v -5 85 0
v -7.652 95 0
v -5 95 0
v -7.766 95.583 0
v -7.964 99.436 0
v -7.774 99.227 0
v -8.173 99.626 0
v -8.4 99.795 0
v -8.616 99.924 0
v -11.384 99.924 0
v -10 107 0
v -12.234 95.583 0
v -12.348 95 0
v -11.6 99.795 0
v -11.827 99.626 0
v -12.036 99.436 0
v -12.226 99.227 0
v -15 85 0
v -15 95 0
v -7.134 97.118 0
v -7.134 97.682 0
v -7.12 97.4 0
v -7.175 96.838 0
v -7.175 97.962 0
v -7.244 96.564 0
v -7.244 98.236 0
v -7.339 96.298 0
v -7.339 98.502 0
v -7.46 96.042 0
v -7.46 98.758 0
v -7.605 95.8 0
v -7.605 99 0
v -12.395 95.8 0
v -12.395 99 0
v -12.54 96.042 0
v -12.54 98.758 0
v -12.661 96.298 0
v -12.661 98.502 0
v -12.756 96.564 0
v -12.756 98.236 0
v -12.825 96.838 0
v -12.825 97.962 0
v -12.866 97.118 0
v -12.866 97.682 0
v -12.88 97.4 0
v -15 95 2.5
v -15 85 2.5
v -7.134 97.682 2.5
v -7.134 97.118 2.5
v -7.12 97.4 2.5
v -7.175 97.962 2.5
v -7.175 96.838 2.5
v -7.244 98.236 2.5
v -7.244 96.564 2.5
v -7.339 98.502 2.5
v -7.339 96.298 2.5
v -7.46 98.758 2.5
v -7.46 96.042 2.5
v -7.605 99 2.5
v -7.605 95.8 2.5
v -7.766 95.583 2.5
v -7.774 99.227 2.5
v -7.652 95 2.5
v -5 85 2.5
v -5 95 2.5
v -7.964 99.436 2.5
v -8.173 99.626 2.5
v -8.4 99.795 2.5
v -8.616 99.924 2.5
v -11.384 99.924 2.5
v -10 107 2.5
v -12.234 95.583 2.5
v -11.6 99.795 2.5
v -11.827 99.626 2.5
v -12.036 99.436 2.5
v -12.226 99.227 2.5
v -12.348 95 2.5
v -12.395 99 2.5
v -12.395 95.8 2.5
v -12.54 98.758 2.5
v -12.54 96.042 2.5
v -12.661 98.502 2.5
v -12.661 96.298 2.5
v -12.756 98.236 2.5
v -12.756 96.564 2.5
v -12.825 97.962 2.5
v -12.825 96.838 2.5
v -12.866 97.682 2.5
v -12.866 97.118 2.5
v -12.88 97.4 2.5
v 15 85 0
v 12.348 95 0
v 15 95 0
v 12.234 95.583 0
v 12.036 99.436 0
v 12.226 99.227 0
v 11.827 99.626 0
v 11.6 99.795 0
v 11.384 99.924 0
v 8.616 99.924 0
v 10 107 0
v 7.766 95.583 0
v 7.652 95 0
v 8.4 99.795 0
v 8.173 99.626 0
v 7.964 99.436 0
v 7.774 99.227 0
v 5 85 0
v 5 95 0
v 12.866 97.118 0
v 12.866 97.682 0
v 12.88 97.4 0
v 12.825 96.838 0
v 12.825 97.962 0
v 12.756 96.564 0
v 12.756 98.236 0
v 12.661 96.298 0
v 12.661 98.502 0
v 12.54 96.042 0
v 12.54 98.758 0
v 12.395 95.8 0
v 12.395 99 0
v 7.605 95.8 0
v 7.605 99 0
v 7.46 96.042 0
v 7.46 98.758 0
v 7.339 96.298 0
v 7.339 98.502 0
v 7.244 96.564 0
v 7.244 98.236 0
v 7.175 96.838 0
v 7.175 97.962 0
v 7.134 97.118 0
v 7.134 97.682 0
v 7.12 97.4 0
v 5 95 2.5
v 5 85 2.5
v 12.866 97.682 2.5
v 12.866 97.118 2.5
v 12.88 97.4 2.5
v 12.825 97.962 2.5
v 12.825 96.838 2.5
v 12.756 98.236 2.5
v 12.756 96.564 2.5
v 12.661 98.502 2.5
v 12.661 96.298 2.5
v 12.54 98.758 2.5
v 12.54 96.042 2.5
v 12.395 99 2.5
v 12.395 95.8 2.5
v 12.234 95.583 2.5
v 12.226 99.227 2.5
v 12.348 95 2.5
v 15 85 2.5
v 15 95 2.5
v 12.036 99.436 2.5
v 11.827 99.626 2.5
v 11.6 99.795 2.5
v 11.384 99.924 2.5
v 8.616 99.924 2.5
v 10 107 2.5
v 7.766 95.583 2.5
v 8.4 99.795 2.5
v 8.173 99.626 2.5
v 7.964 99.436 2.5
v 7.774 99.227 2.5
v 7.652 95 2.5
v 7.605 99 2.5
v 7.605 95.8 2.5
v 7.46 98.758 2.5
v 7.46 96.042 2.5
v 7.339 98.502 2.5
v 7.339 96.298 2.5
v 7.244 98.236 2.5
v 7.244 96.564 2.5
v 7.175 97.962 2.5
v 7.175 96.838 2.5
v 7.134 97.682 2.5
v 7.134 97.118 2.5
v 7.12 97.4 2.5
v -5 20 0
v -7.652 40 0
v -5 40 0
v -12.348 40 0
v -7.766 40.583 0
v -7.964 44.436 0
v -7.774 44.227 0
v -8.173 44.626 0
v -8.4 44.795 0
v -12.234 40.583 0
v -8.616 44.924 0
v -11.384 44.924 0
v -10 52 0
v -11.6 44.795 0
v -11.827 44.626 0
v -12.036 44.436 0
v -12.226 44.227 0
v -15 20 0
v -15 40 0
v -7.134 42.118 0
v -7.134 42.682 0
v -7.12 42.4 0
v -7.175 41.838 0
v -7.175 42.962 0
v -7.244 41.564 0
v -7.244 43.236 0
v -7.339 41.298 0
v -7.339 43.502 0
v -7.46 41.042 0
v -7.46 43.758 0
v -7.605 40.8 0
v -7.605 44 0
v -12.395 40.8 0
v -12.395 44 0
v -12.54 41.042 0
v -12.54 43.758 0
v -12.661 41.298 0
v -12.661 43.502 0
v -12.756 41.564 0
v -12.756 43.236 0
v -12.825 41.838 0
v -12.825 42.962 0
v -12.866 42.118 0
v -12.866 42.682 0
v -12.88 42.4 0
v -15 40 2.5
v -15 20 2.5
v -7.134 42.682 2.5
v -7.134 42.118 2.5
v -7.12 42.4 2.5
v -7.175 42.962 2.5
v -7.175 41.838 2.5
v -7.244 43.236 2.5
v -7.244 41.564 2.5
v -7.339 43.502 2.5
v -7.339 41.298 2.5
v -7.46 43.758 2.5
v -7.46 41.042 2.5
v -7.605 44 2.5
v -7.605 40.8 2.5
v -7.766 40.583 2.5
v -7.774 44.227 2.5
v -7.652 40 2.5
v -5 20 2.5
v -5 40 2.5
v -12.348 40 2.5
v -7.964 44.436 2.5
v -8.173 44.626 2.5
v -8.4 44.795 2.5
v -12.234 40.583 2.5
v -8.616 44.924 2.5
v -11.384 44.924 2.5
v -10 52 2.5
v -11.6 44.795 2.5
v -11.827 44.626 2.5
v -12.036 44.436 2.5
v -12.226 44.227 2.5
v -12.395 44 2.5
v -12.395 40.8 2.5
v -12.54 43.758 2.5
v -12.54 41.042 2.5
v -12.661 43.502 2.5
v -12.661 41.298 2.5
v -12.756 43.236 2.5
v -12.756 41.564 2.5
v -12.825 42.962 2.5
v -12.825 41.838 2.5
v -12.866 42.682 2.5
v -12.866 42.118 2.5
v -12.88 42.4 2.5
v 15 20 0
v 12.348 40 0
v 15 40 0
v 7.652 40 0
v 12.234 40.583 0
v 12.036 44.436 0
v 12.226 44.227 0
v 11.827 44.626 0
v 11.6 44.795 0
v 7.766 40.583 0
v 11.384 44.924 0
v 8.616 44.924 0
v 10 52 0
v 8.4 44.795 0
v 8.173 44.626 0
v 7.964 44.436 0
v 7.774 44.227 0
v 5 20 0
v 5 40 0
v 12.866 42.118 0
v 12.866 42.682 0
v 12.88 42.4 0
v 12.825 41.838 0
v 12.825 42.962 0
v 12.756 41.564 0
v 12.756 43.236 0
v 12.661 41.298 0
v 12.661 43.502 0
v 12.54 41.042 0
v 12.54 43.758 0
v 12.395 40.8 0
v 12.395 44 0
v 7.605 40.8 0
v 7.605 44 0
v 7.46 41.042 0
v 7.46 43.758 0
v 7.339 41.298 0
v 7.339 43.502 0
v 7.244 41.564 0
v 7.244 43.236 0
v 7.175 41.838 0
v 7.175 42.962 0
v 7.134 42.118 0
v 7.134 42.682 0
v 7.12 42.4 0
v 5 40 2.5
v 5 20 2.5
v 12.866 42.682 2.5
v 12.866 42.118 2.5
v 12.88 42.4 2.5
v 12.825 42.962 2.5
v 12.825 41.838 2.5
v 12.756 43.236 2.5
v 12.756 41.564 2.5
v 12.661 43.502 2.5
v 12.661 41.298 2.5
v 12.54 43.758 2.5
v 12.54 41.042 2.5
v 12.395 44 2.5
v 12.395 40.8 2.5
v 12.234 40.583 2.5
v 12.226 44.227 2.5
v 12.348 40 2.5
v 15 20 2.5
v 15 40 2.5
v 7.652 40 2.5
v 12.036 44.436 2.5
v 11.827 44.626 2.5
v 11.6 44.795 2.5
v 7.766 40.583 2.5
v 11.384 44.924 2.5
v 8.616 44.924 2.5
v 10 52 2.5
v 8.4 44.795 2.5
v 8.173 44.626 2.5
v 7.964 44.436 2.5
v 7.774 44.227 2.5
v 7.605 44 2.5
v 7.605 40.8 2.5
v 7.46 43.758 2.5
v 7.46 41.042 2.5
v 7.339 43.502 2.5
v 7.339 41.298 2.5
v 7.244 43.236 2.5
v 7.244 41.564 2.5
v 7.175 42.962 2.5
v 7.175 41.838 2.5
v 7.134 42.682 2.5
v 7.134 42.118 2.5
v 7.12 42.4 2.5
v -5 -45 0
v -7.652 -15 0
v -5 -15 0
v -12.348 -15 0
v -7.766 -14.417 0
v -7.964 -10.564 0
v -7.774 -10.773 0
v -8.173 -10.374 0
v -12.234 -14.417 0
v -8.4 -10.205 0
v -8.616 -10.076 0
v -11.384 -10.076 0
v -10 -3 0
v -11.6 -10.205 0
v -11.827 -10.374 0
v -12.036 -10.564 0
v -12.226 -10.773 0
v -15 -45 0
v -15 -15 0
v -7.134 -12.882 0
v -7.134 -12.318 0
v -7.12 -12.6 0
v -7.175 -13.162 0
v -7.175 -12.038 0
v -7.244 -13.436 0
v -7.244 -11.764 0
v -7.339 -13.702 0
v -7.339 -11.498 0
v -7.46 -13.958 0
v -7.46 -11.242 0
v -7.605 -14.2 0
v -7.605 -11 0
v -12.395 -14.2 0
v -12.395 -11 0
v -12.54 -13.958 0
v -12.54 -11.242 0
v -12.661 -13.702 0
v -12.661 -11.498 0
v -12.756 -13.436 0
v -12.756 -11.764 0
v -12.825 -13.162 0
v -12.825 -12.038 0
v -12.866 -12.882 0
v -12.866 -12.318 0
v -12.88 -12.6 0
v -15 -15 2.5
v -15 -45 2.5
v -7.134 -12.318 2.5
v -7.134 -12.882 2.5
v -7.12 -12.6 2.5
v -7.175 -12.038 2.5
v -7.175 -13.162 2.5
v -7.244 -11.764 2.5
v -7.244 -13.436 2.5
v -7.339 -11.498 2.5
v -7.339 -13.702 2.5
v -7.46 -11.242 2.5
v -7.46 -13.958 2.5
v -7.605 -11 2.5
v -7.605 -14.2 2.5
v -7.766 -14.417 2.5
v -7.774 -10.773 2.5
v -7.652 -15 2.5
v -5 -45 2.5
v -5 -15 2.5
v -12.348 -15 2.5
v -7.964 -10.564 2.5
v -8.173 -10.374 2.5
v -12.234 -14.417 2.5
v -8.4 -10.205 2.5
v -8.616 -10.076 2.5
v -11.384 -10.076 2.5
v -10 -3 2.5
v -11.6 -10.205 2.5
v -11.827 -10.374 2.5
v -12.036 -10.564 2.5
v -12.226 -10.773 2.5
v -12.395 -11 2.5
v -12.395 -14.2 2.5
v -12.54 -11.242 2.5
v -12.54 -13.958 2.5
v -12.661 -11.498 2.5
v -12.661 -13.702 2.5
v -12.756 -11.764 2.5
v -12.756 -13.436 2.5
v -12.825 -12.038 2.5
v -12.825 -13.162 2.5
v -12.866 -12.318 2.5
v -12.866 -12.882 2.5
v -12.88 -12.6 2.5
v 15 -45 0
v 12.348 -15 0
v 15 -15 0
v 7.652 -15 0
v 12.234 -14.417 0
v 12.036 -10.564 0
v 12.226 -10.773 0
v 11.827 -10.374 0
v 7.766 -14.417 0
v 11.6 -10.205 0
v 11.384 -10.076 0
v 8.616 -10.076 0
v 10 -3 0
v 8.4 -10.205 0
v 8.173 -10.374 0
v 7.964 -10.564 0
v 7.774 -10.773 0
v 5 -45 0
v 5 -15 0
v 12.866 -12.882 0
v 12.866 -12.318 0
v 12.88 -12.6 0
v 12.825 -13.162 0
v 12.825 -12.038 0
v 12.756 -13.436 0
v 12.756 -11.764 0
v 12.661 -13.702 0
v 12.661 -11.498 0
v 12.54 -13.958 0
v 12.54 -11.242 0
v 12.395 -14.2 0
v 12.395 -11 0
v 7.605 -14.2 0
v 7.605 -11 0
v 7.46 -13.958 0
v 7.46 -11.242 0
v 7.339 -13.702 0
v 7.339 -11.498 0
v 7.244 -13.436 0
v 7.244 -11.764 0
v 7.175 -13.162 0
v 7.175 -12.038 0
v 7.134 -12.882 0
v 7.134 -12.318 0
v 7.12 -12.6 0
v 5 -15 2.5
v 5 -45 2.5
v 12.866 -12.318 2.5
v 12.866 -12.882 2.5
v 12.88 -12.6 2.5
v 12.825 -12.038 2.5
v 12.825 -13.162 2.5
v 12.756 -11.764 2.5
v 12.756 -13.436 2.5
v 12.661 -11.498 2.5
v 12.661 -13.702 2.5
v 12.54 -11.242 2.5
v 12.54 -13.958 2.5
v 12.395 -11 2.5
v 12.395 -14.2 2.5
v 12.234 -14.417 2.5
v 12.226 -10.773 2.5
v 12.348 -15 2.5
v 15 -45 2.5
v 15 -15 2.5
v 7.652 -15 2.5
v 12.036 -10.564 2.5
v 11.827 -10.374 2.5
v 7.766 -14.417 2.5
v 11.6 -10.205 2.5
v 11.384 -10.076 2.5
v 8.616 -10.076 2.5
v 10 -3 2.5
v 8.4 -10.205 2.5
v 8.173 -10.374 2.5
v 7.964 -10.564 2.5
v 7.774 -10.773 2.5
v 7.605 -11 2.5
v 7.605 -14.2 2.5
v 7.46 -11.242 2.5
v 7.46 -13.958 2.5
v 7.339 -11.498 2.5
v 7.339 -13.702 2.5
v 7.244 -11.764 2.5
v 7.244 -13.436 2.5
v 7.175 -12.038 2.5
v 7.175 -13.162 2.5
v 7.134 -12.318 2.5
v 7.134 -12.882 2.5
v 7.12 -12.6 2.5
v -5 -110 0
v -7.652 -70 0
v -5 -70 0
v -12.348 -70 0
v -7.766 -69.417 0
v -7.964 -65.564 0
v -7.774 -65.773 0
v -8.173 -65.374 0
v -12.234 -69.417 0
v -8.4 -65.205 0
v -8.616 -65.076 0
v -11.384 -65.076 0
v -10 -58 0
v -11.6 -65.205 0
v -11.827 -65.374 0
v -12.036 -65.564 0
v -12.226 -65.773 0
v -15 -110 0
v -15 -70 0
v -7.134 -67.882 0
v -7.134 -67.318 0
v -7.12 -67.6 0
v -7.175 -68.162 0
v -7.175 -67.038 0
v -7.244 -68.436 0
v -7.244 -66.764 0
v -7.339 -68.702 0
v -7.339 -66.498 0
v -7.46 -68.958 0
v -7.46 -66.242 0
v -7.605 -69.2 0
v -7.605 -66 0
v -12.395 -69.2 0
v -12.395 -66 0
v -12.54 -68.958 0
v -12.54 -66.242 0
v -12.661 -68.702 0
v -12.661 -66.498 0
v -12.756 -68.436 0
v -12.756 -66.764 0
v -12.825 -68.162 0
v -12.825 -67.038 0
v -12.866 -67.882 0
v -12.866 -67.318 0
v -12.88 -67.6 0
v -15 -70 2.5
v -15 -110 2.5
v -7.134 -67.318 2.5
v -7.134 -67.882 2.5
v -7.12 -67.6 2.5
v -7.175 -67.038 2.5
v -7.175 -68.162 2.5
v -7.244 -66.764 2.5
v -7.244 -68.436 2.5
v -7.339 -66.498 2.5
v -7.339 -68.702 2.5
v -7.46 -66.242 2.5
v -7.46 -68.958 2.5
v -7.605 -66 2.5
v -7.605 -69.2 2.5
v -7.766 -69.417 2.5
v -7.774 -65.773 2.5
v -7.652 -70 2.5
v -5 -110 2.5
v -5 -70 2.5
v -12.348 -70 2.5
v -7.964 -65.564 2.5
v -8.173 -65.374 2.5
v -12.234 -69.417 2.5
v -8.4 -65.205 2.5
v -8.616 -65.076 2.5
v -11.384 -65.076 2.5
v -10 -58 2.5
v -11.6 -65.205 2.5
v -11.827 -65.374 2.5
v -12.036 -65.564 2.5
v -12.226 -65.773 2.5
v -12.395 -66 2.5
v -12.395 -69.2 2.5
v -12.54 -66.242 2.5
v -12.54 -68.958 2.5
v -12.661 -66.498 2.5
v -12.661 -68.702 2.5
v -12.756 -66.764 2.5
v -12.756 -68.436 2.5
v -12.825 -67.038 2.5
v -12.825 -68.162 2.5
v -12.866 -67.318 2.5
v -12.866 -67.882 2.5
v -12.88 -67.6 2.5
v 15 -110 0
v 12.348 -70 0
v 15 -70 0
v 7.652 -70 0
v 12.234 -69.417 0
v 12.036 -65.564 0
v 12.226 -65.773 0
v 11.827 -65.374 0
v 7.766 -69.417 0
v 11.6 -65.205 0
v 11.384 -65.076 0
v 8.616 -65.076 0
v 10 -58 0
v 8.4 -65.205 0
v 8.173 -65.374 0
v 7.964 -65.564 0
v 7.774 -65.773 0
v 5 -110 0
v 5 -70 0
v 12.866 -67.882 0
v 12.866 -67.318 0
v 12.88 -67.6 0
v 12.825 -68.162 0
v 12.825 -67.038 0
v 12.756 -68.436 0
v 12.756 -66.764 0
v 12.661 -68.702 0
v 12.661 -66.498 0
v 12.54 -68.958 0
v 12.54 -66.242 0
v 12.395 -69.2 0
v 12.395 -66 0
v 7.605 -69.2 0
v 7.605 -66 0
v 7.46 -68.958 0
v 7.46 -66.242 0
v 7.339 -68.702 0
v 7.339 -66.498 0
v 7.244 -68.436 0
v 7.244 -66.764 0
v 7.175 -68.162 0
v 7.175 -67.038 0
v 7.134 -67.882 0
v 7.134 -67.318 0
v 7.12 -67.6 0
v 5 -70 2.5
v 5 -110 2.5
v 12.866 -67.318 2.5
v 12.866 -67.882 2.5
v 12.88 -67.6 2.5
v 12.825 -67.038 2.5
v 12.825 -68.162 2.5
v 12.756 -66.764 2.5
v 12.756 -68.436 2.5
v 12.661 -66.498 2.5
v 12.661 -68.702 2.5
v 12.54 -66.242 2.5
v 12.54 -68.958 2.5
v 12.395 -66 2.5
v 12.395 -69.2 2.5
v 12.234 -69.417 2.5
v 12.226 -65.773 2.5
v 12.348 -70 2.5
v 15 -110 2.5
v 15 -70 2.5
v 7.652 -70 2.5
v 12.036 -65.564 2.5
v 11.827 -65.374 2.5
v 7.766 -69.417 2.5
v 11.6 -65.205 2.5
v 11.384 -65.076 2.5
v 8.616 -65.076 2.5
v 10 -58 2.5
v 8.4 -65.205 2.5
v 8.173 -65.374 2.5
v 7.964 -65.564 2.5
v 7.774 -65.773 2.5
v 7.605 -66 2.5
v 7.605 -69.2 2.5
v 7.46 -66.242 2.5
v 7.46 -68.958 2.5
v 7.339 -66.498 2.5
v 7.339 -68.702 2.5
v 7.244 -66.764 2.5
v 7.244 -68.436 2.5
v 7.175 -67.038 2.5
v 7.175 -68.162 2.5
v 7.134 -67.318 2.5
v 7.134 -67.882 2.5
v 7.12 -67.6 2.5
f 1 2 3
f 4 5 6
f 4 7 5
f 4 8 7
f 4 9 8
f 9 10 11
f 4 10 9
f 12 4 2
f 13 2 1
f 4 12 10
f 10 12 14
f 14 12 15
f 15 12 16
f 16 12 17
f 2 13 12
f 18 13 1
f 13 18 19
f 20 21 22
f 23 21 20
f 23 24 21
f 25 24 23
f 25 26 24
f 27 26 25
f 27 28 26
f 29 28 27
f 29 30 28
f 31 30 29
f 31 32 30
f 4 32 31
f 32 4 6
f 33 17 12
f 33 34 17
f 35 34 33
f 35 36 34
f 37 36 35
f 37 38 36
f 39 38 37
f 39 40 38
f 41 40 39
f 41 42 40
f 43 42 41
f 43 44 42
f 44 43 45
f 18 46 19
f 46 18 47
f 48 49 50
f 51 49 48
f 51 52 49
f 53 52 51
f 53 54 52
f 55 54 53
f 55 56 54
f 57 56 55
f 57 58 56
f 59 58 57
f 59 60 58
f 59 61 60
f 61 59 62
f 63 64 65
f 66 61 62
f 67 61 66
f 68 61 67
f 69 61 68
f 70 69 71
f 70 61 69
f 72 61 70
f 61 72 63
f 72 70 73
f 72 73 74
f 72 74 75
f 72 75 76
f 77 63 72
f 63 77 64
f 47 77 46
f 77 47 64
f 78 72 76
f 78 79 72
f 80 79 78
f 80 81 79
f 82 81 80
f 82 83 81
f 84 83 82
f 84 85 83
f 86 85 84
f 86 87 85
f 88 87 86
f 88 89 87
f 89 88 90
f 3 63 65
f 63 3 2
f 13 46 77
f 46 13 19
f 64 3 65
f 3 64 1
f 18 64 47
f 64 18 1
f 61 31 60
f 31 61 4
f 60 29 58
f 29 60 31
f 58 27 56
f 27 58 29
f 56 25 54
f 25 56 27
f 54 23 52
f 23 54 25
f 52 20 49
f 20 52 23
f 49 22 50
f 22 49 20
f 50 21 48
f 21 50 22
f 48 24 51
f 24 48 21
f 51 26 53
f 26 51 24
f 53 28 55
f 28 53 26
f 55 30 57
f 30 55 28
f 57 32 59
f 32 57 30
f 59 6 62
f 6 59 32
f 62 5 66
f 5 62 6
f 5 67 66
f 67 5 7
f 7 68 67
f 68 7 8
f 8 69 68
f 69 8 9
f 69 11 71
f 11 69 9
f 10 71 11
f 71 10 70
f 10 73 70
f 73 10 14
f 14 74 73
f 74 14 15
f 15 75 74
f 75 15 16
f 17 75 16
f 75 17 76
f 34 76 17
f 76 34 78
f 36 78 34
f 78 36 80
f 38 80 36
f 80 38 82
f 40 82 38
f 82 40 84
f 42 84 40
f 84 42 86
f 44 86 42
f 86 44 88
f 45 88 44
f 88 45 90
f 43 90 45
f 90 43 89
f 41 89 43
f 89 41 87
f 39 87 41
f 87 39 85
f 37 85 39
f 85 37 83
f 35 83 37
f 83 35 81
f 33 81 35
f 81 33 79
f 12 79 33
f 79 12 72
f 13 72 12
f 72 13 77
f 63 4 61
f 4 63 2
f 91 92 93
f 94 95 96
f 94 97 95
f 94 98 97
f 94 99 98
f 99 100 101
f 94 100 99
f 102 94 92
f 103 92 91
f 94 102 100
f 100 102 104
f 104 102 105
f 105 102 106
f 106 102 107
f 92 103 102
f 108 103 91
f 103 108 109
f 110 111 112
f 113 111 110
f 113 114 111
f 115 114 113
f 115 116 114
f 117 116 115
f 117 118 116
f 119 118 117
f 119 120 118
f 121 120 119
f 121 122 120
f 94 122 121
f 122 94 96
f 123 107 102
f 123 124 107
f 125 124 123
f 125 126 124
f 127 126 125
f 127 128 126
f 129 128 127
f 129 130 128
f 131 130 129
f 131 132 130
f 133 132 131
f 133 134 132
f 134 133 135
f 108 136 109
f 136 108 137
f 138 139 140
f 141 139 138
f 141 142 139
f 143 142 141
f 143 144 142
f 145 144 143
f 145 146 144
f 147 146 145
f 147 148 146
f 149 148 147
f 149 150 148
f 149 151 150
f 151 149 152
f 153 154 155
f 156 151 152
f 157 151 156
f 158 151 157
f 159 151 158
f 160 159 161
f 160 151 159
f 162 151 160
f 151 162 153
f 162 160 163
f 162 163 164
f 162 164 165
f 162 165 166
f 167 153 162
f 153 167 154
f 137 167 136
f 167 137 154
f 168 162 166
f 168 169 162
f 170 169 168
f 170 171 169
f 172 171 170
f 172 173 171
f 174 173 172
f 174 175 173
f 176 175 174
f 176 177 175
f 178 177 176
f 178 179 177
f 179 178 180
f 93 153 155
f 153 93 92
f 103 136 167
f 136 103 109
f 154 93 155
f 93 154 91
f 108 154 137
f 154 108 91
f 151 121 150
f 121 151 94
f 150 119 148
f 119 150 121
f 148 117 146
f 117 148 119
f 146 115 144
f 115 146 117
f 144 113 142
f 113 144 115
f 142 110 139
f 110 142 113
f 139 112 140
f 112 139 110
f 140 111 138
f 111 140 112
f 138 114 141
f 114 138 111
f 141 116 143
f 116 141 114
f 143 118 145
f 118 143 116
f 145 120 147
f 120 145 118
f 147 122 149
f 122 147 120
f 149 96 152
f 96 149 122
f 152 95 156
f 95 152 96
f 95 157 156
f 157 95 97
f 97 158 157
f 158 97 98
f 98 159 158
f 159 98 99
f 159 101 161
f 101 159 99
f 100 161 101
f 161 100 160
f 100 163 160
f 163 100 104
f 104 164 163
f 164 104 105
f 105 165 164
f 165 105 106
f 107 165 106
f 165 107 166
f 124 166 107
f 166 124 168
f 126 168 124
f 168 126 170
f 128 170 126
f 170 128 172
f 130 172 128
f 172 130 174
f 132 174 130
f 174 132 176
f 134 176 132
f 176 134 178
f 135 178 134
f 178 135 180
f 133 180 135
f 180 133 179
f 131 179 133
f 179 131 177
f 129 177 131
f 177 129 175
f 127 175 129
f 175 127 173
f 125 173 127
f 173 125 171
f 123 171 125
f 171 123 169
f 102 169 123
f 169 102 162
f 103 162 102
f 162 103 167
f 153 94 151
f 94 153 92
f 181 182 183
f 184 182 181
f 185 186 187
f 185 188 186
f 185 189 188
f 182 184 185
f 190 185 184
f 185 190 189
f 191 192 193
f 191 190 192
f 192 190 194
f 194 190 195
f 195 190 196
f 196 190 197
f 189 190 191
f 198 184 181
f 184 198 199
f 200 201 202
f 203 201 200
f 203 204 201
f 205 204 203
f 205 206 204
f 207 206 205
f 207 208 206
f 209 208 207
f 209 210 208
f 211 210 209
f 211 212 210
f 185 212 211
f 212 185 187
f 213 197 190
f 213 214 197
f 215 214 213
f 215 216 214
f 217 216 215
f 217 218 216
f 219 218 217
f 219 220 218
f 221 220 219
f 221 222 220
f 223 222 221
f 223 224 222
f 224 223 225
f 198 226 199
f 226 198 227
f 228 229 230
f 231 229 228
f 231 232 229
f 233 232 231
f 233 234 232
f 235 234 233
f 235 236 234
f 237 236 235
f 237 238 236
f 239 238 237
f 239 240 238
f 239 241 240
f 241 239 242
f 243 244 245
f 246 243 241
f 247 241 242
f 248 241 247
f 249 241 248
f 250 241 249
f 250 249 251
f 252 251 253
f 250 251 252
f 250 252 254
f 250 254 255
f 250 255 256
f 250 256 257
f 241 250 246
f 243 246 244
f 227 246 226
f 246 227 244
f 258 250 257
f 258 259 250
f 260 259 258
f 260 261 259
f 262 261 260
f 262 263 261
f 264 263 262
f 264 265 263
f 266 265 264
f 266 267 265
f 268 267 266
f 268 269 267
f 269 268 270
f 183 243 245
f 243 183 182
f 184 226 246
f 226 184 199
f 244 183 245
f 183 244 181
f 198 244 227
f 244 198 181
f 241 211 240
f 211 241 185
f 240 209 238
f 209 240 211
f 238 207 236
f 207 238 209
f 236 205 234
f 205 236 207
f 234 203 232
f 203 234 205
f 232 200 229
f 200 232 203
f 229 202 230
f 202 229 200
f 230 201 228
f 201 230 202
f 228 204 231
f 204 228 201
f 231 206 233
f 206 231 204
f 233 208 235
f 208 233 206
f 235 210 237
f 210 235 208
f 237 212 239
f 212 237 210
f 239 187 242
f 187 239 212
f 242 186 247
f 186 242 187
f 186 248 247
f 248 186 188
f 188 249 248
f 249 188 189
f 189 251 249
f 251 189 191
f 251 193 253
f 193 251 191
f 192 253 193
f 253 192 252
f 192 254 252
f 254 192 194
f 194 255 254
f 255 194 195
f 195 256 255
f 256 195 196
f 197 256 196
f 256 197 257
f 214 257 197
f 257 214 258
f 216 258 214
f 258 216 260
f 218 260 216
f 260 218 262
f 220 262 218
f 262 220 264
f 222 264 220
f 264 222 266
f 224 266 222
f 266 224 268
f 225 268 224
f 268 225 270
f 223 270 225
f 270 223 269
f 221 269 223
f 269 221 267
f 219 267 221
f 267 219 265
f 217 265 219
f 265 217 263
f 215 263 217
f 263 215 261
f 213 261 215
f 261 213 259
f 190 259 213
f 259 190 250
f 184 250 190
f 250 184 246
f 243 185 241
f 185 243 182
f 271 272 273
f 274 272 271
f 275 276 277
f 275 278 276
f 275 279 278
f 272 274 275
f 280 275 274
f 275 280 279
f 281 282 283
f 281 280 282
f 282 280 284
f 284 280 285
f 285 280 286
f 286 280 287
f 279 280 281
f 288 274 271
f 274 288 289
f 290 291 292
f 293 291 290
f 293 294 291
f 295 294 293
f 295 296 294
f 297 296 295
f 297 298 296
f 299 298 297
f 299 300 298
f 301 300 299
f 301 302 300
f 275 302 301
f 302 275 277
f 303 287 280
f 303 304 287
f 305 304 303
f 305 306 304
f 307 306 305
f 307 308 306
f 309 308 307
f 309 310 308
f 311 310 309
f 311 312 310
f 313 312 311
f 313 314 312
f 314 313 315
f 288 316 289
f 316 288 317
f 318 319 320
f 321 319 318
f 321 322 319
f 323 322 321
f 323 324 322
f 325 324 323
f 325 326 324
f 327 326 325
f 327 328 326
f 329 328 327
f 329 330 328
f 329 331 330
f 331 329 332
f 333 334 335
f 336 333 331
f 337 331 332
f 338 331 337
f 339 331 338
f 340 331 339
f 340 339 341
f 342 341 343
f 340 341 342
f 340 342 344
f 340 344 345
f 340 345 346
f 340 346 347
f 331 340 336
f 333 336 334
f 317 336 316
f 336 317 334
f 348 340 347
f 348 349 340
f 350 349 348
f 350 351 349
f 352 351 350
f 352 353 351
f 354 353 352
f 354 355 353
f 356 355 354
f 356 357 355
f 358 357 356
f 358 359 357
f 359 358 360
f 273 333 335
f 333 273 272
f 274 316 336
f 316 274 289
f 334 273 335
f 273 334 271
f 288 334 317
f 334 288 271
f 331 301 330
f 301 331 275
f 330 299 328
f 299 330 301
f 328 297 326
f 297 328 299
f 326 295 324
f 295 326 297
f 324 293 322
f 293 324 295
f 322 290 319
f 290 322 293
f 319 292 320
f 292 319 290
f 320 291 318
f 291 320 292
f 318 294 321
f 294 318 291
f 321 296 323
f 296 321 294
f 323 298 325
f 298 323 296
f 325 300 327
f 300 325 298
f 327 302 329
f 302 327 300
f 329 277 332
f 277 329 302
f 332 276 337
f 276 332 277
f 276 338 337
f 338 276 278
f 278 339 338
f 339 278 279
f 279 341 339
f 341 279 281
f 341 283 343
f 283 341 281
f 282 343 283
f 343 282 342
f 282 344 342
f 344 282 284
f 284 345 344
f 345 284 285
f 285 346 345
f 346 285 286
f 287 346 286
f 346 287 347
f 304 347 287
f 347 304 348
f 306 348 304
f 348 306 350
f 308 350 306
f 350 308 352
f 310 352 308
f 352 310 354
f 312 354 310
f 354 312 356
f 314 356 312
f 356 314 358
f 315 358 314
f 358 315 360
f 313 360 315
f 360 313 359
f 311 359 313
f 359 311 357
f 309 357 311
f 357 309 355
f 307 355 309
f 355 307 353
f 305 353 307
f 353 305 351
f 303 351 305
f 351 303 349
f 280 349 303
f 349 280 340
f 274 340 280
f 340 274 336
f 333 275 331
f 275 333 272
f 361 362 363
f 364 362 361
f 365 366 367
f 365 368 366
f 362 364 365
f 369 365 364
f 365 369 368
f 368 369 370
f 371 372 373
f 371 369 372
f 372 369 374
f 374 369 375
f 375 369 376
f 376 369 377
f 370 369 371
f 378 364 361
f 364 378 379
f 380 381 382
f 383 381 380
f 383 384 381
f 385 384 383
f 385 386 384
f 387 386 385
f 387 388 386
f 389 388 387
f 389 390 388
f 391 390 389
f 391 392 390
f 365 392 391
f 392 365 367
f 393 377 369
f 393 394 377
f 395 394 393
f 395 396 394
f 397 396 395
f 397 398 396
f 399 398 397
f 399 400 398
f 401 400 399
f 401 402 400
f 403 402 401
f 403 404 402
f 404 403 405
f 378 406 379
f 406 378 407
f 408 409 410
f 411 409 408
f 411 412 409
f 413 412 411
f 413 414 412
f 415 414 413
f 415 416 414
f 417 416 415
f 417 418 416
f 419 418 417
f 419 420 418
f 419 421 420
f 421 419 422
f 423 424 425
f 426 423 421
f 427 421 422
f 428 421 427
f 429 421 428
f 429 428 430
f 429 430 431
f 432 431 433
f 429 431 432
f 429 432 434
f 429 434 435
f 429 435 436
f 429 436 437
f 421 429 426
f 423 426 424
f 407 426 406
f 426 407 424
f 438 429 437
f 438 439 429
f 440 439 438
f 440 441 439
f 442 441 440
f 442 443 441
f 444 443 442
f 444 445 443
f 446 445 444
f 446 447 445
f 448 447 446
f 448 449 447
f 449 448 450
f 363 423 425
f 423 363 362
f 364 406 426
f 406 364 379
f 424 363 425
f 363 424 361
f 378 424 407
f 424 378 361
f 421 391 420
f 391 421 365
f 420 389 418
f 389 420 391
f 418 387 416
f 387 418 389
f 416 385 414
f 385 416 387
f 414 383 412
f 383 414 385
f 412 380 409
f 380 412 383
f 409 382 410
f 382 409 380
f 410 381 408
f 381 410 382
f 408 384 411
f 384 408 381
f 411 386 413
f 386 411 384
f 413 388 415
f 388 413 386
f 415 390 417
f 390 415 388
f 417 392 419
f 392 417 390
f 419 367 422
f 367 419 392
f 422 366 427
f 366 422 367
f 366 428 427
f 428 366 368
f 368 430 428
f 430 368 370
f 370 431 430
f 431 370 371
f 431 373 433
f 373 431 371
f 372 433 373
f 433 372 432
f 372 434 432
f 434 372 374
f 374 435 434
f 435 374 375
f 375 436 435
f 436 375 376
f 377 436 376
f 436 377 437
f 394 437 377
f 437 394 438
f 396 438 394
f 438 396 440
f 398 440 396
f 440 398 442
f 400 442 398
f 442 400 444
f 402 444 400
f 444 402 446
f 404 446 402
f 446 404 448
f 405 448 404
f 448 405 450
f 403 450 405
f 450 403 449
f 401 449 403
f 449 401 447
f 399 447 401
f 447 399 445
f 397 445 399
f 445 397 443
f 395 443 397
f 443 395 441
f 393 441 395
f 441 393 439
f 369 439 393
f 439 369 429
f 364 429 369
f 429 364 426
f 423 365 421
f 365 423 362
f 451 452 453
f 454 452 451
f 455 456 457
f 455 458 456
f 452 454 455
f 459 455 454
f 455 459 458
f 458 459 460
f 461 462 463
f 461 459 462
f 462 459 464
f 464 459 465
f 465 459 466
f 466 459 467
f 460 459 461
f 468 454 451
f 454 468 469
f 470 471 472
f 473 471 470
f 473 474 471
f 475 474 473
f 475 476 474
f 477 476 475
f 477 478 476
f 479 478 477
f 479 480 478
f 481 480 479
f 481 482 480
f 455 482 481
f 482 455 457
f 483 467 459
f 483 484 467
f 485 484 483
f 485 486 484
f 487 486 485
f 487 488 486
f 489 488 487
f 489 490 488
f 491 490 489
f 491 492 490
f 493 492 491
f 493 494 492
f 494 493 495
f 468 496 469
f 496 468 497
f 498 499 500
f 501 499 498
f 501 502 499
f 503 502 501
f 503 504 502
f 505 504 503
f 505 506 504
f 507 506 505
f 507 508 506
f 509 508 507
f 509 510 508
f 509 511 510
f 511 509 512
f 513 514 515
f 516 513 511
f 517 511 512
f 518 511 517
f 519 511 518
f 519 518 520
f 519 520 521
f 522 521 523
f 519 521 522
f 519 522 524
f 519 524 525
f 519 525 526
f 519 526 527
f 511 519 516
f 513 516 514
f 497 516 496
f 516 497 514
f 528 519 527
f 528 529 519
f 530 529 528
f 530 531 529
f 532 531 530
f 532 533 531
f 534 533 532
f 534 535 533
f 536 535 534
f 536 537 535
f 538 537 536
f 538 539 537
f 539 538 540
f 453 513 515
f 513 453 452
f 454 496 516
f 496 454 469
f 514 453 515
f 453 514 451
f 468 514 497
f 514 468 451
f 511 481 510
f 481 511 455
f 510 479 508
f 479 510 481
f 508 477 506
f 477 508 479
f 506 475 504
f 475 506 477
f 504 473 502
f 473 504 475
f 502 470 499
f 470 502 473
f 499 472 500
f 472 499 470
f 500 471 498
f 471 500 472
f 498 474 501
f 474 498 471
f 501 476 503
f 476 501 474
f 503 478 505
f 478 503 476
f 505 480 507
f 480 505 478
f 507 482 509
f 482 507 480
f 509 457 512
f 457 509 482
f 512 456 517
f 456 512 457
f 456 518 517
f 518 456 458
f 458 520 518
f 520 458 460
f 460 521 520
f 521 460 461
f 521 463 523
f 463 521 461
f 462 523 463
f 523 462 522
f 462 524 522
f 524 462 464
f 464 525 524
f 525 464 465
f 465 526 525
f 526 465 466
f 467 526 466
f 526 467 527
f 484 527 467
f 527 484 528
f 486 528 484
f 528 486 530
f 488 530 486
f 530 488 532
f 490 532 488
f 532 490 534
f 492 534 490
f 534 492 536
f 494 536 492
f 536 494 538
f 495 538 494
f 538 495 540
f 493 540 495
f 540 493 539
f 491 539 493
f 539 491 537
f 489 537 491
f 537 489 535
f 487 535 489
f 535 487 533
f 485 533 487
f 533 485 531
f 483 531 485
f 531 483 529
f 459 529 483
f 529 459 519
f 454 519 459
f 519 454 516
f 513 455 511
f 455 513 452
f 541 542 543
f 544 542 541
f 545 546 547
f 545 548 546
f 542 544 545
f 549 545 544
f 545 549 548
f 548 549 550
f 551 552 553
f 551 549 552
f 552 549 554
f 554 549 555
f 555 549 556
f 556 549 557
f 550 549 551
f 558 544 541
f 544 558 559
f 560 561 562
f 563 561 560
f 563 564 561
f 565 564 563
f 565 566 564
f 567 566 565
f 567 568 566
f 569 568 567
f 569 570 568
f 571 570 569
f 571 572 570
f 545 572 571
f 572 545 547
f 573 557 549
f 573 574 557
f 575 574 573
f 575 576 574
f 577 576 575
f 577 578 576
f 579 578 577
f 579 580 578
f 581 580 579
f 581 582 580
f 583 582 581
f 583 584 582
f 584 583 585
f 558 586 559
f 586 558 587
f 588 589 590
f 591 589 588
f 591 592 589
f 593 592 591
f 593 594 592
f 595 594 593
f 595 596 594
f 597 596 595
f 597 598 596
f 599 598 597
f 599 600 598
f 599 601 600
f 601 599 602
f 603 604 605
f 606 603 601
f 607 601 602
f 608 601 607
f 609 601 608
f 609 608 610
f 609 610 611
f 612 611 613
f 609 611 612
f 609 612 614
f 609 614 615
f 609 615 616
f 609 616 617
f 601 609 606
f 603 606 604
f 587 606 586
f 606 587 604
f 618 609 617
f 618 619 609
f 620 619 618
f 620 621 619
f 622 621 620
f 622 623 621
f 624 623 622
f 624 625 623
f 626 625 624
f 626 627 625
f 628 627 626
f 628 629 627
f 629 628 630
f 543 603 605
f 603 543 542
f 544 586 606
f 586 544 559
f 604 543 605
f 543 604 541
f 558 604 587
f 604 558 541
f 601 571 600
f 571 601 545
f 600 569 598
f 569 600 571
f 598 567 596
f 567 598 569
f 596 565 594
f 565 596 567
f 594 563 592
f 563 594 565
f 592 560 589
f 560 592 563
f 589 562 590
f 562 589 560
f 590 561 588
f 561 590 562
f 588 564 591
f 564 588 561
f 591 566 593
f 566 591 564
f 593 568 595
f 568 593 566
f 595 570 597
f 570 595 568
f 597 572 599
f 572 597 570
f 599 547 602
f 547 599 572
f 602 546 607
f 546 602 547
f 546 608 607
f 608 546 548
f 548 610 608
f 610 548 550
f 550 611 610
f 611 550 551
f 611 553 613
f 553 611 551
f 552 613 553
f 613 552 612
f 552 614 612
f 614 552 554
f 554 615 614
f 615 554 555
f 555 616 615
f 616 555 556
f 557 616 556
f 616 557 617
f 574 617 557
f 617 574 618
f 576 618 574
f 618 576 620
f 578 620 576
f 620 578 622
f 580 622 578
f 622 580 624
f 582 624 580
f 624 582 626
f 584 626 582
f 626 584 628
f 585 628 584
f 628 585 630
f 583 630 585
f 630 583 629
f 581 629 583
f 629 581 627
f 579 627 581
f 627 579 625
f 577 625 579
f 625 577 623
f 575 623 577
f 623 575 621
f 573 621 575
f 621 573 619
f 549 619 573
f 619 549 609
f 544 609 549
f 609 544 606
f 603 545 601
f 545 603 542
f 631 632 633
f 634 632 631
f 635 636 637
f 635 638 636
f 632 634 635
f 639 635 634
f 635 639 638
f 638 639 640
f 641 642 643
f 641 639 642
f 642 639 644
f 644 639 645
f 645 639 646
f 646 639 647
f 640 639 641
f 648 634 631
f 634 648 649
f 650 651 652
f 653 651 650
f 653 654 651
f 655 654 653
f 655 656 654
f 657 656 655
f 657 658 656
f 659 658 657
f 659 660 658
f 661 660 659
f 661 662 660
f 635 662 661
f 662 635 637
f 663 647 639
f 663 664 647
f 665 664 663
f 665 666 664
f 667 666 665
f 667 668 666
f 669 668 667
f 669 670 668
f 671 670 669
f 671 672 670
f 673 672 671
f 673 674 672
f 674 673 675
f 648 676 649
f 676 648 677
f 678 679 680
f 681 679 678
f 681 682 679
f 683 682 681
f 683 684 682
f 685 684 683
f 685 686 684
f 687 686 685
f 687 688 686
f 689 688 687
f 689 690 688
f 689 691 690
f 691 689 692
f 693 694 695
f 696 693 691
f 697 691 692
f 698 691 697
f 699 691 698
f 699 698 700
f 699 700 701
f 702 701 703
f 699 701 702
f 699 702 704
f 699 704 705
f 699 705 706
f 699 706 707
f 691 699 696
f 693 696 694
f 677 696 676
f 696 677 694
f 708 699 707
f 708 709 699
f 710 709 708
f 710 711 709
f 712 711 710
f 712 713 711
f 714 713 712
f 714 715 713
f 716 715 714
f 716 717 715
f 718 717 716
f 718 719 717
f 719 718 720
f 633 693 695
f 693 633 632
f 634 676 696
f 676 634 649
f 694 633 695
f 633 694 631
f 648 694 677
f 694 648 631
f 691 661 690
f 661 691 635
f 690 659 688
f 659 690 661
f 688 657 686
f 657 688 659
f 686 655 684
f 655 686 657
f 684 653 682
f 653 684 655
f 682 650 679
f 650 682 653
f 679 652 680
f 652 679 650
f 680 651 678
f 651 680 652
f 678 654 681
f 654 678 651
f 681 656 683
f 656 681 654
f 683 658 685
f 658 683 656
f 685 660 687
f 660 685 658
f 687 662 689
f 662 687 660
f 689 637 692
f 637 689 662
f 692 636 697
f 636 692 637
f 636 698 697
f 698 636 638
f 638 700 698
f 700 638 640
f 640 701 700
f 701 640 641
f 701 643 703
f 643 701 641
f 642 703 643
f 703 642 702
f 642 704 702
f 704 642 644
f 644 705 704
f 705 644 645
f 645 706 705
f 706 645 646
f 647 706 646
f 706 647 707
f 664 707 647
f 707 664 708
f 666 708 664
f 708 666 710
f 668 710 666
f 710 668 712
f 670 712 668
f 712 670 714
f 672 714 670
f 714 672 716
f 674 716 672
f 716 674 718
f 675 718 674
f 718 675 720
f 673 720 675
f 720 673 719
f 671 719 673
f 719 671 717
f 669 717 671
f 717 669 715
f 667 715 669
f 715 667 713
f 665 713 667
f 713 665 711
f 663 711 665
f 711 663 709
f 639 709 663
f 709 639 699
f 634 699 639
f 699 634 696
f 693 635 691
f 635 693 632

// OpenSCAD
// OpenSCAD 2021.01+
// 8x ANNULUS CANDLE TOKENS (2 per step/level) — scale-matched to candles.scad
// Source reference: /mnt/data/candles.scad (annulus candle icons on ring)
// Units: millimeters

$fn = 64;

// =====================
// USER PARAMETERS
// =====================
show_numbers = false;      // embossed label on body
label_is_level = true;    // if true: label = level (0..3). if false: label = copy index.

// Print-friendly tweaks
base_plate = false;        // adds a thin base under each candle for easier printing
base_plate_th = 0.60;     // mm
base_plate_margin = 0.70; // mm around the candle silhouette

// Spacing / layout
copies_per_level = 2;     // 2 per step as requested
levels = [0,1,2,3];
cell_pitch_x = 20;        // mm (center-to-center)
cell_pitch_y = 60;        // mm

// =====================
// GEOMETRY (copied from candles.scad; keep identical scale)
// =====================
mark_th        = 2.5;
ann_body_w       = 10;
ann_body_h0      = 10;
ann_body_h_step  = 10;

ann_flame_w    = 6;
ann_flame_h    = 12;
ann_flame_y_gap = 0;

font_name = "Liberation Sans:style=Bold";
ann_num_size  = 1.0;
ann_num_th    = 0.22;

// Small helper: 2D flame (as in the original)
module _flame_2d() {
  union() {
    translate([0, ann_flame_h*0.35]) circle(r=ann_flame_w*0.48);
    polygon(points=[
      [0, ann_flame_h*1.15],
      [-ann_flame_w*0.45, 0],
      [ ann_flame_w*0.45, 0]
    ]);
  }
}

// Small candle icon CENTERED at origin (original geometry)
module annulus_candle_icon_centered(level=0, label="0") {
  body_h = ann_body_h0 + level * ann_body_h_step;

  union() {
    // body
    linear_extrude(height=mark_th)
      square([ann_body_w, body_h], center=true);

    // number (embossed)
    if (show_numbers) {
      translate([0, 0, mark_th])
        linear_extrude(height=ann_num_th)
          text(label, size=ann_num_size, font=font_name, halign="center", valign="center");
    }

    // flame
    top_y = body_h/2 - ann_flame_h*0.15;
    linear_extrude(height=mark_th)
      translate([0, top_y])
        _flame_2d();
  }
}

// A printable token: candle icon + optional thin base plate
module annulus_candle_token(level=0, label="0") {
  body_h = ann_body_h0 + level * ann_body_h_step;

  // approximate bounding box for base plate
  candle_w = max(ann_body_w, ann_flame_w);
  candle_h = body_h + ann_flame_y_gap + ann_flame_h*1.15; // includes flame apex

  union() {
    if (base_plate) {
      // Slightly larger rectangle base; helps adhesion and makes parts less fragile.
      translate([0, 0, 0])
        linear_extrude(height=base_plate_th)
          square([candle_w + 2*base_plate_margin, candle_h + 2*base_plate_margin], center=true);

      // Lift the candle geometry so it sits on top of the plate
      translate([0, 0, base_plate_th])
        annulus_candle_icon_centered(level=level, label=label);
    } else {
      annulus_candle_icon_centered(level=level, label=label);
    }
  }
}

// =====================
// LAYOUT: 8 tokens (2 per level)
// =====================
module layout_8_tokens() {
  // 4 levels x 2 copies => 8 parts
  // Grid: columns = copies_per_level, rows = len(levels)
  for (r = [0:len(levels)-1]) {
    lvl = levels[r];
    for (c = [0:copies_per_level-1]) {
      idx = r*copies_per_level + c;
      lab = label_is_level ? str(lvl) : str(idx);

      translate([
        (c - (copies_per_level-1)/2) * cell_pitch_x,
        ((len(levels)-1)/2 - r) * cell_pitch_y,
        0
      ])
        annulus_candle_token(level=lvl, label=lab);
    }
  }
}

layout_8_tokens();
